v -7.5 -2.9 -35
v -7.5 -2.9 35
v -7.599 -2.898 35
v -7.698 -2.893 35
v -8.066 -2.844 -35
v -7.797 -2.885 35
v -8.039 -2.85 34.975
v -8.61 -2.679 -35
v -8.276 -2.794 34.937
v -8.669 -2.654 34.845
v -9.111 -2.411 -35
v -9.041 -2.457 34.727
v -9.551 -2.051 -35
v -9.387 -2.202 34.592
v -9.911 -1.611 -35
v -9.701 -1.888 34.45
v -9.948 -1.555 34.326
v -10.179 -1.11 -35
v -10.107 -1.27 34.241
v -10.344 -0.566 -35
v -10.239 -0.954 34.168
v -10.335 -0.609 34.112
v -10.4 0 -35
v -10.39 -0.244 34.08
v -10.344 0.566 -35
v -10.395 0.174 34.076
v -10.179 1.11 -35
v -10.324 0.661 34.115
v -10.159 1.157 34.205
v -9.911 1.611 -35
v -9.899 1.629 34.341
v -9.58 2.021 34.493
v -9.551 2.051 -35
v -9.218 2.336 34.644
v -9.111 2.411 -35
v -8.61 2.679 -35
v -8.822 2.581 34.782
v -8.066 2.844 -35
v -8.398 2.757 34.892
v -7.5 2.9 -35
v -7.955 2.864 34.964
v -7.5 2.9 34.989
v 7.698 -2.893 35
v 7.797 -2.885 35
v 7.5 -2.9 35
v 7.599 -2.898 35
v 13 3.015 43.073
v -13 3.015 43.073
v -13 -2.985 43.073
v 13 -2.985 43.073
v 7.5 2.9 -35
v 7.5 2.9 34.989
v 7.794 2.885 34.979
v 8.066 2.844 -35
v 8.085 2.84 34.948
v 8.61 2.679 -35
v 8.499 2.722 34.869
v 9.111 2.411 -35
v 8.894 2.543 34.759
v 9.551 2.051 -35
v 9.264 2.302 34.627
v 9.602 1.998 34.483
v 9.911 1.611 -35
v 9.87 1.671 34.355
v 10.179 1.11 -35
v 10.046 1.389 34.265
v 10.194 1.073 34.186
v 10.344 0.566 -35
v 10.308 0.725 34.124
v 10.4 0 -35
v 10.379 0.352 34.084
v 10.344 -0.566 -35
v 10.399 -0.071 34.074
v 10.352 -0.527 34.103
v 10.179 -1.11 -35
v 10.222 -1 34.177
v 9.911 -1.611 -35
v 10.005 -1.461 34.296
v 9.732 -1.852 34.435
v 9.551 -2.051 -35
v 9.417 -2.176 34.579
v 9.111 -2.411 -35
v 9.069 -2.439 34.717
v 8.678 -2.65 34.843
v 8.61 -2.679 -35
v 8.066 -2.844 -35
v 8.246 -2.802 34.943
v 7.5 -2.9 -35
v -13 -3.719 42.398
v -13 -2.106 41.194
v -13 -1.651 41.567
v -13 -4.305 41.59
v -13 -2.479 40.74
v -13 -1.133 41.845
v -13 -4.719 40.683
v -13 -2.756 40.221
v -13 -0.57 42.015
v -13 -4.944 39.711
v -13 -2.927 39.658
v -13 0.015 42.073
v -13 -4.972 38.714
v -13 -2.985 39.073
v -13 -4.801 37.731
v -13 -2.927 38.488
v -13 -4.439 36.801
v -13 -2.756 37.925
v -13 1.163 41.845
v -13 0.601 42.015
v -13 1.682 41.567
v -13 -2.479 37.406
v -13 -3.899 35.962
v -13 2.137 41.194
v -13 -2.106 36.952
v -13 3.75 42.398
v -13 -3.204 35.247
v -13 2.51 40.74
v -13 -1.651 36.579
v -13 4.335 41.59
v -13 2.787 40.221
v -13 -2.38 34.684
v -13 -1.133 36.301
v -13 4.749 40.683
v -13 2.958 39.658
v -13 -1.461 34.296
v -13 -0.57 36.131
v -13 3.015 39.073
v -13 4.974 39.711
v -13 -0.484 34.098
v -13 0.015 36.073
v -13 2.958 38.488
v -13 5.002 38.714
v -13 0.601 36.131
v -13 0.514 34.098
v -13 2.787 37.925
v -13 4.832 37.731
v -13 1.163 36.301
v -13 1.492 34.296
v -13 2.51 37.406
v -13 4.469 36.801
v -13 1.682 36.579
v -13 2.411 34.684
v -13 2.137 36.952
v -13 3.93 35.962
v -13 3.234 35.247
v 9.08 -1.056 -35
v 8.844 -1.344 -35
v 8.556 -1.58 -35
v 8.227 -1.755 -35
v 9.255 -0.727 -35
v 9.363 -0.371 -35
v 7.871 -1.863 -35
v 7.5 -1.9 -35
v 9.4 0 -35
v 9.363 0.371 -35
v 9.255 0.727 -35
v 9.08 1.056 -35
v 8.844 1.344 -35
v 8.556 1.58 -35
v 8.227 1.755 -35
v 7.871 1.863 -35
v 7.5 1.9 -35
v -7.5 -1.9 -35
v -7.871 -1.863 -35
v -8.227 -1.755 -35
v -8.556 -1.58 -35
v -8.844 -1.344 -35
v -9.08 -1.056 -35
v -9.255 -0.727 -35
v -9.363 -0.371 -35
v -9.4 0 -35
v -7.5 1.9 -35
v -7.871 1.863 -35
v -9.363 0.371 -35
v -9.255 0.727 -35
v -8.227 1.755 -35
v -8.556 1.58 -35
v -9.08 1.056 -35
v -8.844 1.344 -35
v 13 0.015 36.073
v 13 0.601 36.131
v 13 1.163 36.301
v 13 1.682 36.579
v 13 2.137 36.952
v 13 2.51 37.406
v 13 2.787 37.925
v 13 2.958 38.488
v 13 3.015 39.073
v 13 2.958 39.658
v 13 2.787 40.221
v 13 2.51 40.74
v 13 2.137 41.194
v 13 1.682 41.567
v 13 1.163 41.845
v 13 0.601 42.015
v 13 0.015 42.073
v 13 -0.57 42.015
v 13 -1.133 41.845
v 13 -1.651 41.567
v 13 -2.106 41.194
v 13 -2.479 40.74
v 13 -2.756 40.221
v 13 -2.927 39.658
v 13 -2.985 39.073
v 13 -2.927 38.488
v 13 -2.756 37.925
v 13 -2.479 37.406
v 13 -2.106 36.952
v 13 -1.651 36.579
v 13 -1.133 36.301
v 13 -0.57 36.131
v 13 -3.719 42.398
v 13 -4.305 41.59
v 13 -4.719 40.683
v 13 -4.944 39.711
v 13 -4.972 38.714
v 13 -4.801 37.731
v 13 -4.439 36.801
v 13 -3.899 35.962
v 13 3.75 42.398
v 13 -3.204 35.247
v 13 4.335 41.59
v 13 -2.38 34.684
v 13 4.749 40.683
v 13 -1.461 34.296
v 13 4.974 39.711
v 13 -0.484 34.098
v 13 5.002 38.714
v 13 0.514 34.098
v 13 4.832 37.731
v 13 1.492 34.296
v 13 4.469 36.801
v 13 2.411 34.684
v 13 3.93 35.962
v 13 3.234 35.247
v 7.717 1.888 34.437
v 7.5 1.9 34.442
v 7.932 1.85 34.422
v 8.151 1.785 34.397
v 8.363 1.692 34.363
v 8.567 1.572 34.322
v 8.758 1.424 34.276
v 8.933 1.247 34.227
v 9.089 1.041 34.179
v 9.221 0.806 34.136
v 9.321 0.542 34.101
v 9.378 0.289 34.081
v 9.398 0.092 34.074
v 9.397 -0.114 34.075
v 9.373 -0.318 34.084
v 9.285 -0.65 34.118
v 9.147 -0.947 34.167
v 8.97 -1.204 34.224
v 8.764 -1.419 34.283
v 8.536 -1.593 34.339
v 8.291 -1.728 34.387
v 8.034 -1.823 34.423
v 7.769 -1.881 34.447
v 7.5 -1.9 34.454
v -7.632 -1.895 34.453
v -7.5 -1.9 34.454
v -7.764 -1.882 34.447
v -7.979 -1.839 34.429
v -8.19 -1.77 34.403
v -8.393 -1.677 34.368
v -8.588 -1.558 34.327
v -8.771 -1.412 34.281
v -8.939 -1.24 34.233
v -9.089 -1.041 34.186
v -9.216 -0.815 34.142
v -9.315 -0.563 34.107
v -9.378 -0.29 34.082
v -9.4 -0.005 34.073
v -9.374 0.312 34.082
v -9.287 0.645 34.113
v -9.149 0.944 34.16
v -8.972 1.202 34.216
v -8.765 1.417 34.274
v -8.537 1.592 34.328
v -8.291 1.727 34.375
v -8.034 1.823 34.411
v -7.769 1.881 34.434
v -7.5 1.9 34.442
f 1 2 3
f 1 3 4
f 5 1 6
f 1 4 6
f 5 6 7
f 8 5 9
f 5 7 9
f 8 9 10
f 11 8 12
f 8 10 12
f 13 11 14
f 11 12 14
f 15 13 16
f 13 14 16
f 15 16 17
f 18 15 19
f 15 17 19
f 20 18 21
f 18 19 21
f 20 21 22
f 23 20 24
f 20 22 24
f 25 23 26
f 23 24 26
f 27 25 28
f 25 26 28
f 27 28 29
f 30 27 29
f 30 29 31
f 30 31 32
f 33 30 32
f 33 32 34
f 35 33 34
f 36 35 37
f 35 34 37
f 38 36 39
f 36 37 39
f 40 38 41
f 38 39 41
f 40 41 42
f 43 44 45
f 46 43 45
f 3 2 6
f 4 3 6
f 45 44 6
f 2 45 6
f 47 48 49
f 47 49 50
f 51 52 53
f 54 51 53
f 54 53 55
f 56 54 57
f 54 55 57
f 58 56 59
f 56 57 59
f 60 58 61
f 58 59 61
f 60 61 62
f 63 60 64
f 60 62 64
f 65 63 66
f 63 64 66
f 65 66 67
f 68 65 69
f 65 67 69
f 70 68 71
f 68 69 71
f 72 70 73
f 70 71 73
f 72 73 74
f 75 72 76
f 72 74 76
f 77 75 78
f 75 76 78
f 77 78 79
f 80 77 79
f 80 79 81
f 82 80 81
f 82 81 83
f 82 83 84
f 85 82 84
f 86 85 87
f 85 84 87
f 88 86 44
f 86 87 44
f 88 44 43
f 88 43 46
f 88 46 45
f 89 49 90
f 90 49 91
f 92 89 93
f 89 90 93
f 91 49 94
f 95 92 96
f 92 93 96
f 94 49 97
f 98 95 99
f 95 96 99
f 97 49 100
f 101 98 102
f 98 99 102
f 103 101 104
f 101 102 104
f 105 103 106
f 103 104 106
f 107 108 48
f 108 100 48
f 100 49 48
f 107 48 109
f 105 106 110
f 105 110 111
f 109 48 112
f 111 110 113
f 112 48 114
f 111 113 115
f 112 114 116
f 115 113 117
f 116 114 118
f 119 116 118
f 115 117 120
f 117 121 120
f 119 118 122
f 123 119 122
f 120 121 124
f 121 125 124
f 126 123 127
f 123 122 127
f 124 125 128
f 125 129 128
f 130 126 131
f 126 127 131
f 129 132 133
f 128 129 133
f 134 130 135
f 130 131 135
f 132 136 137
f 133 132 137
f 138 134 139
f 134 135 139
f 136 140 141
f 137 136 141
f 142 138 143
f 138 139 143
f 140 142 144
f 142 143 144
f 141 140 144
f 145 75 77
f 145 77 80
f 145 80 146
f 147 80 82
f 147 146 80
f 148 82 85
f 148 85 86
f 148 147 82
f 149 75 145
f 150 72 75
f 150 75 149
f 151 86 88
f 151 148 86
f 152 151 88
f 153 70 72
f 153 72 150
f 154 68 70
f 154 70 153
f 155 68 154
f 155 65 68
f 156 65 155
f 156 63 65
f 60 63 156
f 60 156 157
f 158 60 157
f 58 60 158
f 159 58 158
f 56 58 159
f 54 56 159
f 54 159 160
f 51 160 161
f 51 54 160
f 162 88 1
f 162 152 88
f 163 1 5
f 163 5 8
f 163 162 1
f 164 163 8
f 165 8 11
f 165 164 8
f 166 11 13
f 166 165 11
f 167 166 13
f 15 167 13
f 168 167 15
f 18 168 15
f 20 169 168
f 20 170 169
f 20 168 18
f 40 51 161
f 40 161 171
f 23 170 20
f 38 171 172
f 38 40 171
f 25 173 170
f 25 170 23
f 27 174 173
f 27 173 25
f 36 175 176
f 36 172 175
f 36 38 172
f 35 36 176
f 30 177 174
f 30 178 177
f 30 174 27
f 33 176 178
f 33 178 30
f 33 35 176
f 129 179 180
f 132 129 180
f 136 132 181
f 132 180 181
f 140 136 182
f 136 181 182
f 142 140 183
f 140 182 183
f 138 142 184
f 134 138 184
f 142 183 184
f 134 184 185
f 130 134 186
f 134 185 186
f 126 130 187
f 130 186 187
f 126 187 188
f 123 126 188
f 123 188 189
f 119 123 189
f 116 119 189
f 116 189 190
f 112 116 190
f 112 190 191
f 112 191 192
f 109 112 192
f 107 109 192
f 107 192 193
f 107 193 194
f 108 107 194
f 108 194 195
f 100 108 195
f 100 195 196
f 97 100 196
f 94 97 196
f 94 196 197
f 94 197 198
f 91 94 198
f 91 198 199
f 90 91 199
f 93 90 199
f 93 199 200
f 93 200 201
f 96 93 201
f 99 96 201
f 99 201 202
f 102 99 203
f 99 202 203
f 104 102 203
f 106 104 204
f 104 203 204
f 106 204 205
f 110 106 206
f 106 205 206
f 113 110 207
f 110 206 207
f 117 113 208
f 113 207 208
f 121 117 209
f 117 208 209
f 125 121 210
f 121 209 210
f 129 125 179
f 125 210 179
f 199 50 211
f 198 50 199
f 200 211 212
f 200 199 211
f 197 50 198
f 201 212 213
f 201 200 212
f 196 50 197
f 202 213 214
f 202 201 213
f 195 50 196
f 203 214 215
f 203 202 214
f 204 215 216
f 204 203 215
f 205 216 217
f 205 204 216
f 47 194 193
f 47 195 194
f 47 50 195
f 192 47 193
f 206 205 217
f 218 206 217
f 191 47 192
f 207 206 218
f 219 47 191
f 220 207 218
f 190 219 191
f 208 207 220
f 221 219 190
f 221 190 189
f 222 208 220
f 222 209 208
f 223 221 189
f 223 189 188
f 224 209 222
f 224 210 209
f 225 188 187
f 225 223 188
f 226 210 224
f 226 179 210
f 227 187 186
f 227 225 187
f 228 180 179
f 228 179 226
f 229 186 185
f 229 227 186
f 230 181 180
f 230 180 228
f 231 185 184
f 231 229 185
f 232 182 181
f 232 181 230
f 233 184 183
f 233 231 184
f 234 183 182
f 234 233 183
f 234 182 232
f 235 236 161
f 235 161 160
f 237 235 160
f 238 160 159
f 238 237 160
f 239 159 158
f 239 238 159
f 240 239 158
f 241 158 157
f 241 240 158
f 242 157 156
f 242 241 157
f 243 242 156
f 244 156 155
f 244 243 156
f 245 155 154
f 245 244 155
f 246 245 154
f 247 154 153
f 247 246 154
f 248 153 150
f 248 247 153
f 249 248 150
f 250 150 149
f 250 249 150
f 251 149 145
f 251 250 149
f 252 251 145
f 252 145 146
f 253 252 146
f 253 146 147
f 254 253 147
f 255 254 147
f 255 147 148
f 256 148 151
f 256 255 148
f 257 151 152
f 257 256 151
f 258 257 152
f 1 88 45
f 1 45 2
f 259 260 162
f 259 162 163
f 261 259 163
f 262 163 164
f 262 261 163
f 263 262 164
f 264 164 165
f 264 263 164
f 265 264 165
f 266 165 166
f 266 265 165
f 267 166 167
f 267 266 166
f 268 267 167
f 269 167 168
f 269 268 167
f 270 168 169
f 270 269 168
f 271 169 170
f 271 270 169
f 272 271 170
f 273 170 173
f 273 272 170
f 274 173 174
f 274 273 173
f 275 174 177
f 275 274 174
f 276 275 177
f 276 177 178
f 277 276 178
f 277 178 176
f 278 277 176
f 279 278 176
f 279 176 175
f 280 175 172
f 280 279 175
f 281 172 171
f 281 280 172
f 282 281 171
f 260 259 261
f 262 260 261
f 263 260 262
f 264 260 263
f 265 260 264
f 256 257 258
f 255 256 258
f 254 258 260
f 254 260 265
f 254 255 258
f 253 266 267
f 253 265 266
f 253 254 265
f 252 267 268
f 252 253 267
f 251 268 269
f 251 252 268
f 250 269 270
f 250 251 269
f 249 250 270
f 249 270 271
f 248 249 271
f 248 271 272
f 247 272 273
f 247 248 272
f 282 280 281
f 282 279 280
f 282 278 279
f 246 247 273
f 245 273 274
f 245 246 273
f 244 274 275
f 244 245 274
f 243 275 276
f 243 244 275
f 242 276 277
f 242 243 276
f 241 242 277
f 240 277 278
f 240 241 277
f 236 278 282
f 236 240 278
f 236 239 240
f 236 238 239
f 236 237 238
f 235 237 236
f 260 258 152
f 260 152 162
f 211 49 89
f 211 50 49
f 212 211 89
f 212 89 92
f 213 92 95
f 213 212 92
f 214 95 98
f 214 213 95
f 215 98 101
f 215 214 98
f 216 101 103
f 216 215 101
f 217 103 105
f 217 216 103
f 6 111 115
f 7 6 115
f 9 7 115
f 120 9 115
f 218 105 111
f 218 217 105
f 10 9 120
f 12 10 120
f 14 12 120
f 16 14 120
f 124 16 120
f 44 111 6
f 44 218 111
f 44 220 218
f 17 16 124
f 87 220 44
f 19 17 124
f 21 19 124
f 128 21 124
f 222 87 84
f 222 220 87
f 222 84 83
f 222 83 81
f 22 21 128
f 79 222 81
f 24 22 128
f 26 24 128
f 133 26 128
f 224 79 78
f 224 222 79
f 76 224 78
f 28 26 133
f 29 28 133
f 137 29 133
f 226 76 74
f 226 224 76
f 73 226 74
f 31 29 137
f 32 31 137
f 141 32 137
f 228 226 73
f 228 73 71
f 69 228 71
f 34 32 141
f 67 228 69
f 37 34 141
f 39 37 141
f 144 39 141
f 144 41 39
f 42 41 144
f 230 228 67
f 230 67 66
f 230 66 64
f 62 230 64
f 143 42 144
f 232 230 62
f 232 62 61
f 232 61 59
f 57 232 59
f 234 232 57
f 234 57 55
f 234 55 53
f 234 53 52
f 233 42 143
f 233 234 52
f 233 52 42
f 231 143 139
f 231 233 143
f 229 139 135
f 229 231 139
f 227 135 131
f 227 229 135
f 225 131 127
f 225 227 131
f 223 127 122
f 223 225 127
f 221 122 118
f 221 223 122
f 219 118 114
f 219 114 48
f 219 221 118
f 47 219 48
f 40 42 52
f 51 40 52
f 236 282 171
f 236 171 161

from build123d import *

# Parameters (mm, degrees)
BOSS_EXTRUDE1_DEPTH = 35
SKETCH9_R           = 5
BOSS_EXTRUDE3_DEPTH = 13
SKETCH10_W          = 39.744762059
SKETCH10_H          = 6.949903748
CUT_EXTRUDE1_DEPTH  = 13
SKETCH12_R          = 3
CUT_EXTRUDE3_DEPTH  = 51.56128384


with BuildPart() as part:
    # Sketch4 → Boss-Extrude1 (new, symmetric)
    with BuildSketch(Plane.XY):
        with BuildLine():
            Line((7.5, -2.9), (-7.5, -2.9))
            ThreePointArc((-7.5, -2.9), (-10.4, 0), (-7.5, 2.9))
            Line((-7.5, 2.9), (7.5, 2.9))
            ThreePointArc((7.5, 2.9), (10.4, 0), (7.5, -2.9))
        make_face()
        with BuildLine():
            Line((7.5, -1.9), (-7.5, -1.9))
            ThreePointArc((-7.5, -1.9), (-9.4, 0), (-7.5, 1.9))
            Line((-7.5, 1.9), (7.5, 1.9))
            ThreePointArc((7.5, 1.9), (9.4, 0), (7.5, -1.9))
        make_face(mode=Mode.SUBTRACT)
    extrude(amount=BOSS_EXTRUDE1_DEPTH, both=True)

    # Sketch9 → Boss-Extrude3 (add, symmetric)
    with BuildSketch(Plane(origin=(0, 0, 0), x_dir=(0, 0, -1), z_dir=(1, 0, 0))):
        with Locations((-39.073082371, 0.015275052)):
            Circle(SKETCH9_R)
    extrude(amount=BOSS_EXTRUDE3_DEPTH, both=True)

    # Sketch10 → Cut-Extrude1 (cut, symmetric)
    with BuildSketch(Plane(origin=(0, 0, 0), x_dir=(1, 0, 0), z_dir=(0, 1, 0))):
        with Locations((-2.189570447, -46.548034245)):
            Rectangle(SKETCH10_W, SKETCH10_H)
    extrude(amount=CUT_EXTRUDE1_DEPTH, both=True, mode=Mode.SUBTRACT)

    # Sketch12 → Cut-Extrude3 (cut, through all)
    with BuildSketch(Plane(origin=(13, 0, 0), x_dir=(0, 0, -1), z_dir=(1, 0, 0))):
        with Locations((-39.073082371, 0.015275052)):
            Circle(SKETCH12_R)
    extrude(amount=-CUT_EXTRUDE3_DEPTH, mode=Mode.SUBTRACT)


solid = part.part
